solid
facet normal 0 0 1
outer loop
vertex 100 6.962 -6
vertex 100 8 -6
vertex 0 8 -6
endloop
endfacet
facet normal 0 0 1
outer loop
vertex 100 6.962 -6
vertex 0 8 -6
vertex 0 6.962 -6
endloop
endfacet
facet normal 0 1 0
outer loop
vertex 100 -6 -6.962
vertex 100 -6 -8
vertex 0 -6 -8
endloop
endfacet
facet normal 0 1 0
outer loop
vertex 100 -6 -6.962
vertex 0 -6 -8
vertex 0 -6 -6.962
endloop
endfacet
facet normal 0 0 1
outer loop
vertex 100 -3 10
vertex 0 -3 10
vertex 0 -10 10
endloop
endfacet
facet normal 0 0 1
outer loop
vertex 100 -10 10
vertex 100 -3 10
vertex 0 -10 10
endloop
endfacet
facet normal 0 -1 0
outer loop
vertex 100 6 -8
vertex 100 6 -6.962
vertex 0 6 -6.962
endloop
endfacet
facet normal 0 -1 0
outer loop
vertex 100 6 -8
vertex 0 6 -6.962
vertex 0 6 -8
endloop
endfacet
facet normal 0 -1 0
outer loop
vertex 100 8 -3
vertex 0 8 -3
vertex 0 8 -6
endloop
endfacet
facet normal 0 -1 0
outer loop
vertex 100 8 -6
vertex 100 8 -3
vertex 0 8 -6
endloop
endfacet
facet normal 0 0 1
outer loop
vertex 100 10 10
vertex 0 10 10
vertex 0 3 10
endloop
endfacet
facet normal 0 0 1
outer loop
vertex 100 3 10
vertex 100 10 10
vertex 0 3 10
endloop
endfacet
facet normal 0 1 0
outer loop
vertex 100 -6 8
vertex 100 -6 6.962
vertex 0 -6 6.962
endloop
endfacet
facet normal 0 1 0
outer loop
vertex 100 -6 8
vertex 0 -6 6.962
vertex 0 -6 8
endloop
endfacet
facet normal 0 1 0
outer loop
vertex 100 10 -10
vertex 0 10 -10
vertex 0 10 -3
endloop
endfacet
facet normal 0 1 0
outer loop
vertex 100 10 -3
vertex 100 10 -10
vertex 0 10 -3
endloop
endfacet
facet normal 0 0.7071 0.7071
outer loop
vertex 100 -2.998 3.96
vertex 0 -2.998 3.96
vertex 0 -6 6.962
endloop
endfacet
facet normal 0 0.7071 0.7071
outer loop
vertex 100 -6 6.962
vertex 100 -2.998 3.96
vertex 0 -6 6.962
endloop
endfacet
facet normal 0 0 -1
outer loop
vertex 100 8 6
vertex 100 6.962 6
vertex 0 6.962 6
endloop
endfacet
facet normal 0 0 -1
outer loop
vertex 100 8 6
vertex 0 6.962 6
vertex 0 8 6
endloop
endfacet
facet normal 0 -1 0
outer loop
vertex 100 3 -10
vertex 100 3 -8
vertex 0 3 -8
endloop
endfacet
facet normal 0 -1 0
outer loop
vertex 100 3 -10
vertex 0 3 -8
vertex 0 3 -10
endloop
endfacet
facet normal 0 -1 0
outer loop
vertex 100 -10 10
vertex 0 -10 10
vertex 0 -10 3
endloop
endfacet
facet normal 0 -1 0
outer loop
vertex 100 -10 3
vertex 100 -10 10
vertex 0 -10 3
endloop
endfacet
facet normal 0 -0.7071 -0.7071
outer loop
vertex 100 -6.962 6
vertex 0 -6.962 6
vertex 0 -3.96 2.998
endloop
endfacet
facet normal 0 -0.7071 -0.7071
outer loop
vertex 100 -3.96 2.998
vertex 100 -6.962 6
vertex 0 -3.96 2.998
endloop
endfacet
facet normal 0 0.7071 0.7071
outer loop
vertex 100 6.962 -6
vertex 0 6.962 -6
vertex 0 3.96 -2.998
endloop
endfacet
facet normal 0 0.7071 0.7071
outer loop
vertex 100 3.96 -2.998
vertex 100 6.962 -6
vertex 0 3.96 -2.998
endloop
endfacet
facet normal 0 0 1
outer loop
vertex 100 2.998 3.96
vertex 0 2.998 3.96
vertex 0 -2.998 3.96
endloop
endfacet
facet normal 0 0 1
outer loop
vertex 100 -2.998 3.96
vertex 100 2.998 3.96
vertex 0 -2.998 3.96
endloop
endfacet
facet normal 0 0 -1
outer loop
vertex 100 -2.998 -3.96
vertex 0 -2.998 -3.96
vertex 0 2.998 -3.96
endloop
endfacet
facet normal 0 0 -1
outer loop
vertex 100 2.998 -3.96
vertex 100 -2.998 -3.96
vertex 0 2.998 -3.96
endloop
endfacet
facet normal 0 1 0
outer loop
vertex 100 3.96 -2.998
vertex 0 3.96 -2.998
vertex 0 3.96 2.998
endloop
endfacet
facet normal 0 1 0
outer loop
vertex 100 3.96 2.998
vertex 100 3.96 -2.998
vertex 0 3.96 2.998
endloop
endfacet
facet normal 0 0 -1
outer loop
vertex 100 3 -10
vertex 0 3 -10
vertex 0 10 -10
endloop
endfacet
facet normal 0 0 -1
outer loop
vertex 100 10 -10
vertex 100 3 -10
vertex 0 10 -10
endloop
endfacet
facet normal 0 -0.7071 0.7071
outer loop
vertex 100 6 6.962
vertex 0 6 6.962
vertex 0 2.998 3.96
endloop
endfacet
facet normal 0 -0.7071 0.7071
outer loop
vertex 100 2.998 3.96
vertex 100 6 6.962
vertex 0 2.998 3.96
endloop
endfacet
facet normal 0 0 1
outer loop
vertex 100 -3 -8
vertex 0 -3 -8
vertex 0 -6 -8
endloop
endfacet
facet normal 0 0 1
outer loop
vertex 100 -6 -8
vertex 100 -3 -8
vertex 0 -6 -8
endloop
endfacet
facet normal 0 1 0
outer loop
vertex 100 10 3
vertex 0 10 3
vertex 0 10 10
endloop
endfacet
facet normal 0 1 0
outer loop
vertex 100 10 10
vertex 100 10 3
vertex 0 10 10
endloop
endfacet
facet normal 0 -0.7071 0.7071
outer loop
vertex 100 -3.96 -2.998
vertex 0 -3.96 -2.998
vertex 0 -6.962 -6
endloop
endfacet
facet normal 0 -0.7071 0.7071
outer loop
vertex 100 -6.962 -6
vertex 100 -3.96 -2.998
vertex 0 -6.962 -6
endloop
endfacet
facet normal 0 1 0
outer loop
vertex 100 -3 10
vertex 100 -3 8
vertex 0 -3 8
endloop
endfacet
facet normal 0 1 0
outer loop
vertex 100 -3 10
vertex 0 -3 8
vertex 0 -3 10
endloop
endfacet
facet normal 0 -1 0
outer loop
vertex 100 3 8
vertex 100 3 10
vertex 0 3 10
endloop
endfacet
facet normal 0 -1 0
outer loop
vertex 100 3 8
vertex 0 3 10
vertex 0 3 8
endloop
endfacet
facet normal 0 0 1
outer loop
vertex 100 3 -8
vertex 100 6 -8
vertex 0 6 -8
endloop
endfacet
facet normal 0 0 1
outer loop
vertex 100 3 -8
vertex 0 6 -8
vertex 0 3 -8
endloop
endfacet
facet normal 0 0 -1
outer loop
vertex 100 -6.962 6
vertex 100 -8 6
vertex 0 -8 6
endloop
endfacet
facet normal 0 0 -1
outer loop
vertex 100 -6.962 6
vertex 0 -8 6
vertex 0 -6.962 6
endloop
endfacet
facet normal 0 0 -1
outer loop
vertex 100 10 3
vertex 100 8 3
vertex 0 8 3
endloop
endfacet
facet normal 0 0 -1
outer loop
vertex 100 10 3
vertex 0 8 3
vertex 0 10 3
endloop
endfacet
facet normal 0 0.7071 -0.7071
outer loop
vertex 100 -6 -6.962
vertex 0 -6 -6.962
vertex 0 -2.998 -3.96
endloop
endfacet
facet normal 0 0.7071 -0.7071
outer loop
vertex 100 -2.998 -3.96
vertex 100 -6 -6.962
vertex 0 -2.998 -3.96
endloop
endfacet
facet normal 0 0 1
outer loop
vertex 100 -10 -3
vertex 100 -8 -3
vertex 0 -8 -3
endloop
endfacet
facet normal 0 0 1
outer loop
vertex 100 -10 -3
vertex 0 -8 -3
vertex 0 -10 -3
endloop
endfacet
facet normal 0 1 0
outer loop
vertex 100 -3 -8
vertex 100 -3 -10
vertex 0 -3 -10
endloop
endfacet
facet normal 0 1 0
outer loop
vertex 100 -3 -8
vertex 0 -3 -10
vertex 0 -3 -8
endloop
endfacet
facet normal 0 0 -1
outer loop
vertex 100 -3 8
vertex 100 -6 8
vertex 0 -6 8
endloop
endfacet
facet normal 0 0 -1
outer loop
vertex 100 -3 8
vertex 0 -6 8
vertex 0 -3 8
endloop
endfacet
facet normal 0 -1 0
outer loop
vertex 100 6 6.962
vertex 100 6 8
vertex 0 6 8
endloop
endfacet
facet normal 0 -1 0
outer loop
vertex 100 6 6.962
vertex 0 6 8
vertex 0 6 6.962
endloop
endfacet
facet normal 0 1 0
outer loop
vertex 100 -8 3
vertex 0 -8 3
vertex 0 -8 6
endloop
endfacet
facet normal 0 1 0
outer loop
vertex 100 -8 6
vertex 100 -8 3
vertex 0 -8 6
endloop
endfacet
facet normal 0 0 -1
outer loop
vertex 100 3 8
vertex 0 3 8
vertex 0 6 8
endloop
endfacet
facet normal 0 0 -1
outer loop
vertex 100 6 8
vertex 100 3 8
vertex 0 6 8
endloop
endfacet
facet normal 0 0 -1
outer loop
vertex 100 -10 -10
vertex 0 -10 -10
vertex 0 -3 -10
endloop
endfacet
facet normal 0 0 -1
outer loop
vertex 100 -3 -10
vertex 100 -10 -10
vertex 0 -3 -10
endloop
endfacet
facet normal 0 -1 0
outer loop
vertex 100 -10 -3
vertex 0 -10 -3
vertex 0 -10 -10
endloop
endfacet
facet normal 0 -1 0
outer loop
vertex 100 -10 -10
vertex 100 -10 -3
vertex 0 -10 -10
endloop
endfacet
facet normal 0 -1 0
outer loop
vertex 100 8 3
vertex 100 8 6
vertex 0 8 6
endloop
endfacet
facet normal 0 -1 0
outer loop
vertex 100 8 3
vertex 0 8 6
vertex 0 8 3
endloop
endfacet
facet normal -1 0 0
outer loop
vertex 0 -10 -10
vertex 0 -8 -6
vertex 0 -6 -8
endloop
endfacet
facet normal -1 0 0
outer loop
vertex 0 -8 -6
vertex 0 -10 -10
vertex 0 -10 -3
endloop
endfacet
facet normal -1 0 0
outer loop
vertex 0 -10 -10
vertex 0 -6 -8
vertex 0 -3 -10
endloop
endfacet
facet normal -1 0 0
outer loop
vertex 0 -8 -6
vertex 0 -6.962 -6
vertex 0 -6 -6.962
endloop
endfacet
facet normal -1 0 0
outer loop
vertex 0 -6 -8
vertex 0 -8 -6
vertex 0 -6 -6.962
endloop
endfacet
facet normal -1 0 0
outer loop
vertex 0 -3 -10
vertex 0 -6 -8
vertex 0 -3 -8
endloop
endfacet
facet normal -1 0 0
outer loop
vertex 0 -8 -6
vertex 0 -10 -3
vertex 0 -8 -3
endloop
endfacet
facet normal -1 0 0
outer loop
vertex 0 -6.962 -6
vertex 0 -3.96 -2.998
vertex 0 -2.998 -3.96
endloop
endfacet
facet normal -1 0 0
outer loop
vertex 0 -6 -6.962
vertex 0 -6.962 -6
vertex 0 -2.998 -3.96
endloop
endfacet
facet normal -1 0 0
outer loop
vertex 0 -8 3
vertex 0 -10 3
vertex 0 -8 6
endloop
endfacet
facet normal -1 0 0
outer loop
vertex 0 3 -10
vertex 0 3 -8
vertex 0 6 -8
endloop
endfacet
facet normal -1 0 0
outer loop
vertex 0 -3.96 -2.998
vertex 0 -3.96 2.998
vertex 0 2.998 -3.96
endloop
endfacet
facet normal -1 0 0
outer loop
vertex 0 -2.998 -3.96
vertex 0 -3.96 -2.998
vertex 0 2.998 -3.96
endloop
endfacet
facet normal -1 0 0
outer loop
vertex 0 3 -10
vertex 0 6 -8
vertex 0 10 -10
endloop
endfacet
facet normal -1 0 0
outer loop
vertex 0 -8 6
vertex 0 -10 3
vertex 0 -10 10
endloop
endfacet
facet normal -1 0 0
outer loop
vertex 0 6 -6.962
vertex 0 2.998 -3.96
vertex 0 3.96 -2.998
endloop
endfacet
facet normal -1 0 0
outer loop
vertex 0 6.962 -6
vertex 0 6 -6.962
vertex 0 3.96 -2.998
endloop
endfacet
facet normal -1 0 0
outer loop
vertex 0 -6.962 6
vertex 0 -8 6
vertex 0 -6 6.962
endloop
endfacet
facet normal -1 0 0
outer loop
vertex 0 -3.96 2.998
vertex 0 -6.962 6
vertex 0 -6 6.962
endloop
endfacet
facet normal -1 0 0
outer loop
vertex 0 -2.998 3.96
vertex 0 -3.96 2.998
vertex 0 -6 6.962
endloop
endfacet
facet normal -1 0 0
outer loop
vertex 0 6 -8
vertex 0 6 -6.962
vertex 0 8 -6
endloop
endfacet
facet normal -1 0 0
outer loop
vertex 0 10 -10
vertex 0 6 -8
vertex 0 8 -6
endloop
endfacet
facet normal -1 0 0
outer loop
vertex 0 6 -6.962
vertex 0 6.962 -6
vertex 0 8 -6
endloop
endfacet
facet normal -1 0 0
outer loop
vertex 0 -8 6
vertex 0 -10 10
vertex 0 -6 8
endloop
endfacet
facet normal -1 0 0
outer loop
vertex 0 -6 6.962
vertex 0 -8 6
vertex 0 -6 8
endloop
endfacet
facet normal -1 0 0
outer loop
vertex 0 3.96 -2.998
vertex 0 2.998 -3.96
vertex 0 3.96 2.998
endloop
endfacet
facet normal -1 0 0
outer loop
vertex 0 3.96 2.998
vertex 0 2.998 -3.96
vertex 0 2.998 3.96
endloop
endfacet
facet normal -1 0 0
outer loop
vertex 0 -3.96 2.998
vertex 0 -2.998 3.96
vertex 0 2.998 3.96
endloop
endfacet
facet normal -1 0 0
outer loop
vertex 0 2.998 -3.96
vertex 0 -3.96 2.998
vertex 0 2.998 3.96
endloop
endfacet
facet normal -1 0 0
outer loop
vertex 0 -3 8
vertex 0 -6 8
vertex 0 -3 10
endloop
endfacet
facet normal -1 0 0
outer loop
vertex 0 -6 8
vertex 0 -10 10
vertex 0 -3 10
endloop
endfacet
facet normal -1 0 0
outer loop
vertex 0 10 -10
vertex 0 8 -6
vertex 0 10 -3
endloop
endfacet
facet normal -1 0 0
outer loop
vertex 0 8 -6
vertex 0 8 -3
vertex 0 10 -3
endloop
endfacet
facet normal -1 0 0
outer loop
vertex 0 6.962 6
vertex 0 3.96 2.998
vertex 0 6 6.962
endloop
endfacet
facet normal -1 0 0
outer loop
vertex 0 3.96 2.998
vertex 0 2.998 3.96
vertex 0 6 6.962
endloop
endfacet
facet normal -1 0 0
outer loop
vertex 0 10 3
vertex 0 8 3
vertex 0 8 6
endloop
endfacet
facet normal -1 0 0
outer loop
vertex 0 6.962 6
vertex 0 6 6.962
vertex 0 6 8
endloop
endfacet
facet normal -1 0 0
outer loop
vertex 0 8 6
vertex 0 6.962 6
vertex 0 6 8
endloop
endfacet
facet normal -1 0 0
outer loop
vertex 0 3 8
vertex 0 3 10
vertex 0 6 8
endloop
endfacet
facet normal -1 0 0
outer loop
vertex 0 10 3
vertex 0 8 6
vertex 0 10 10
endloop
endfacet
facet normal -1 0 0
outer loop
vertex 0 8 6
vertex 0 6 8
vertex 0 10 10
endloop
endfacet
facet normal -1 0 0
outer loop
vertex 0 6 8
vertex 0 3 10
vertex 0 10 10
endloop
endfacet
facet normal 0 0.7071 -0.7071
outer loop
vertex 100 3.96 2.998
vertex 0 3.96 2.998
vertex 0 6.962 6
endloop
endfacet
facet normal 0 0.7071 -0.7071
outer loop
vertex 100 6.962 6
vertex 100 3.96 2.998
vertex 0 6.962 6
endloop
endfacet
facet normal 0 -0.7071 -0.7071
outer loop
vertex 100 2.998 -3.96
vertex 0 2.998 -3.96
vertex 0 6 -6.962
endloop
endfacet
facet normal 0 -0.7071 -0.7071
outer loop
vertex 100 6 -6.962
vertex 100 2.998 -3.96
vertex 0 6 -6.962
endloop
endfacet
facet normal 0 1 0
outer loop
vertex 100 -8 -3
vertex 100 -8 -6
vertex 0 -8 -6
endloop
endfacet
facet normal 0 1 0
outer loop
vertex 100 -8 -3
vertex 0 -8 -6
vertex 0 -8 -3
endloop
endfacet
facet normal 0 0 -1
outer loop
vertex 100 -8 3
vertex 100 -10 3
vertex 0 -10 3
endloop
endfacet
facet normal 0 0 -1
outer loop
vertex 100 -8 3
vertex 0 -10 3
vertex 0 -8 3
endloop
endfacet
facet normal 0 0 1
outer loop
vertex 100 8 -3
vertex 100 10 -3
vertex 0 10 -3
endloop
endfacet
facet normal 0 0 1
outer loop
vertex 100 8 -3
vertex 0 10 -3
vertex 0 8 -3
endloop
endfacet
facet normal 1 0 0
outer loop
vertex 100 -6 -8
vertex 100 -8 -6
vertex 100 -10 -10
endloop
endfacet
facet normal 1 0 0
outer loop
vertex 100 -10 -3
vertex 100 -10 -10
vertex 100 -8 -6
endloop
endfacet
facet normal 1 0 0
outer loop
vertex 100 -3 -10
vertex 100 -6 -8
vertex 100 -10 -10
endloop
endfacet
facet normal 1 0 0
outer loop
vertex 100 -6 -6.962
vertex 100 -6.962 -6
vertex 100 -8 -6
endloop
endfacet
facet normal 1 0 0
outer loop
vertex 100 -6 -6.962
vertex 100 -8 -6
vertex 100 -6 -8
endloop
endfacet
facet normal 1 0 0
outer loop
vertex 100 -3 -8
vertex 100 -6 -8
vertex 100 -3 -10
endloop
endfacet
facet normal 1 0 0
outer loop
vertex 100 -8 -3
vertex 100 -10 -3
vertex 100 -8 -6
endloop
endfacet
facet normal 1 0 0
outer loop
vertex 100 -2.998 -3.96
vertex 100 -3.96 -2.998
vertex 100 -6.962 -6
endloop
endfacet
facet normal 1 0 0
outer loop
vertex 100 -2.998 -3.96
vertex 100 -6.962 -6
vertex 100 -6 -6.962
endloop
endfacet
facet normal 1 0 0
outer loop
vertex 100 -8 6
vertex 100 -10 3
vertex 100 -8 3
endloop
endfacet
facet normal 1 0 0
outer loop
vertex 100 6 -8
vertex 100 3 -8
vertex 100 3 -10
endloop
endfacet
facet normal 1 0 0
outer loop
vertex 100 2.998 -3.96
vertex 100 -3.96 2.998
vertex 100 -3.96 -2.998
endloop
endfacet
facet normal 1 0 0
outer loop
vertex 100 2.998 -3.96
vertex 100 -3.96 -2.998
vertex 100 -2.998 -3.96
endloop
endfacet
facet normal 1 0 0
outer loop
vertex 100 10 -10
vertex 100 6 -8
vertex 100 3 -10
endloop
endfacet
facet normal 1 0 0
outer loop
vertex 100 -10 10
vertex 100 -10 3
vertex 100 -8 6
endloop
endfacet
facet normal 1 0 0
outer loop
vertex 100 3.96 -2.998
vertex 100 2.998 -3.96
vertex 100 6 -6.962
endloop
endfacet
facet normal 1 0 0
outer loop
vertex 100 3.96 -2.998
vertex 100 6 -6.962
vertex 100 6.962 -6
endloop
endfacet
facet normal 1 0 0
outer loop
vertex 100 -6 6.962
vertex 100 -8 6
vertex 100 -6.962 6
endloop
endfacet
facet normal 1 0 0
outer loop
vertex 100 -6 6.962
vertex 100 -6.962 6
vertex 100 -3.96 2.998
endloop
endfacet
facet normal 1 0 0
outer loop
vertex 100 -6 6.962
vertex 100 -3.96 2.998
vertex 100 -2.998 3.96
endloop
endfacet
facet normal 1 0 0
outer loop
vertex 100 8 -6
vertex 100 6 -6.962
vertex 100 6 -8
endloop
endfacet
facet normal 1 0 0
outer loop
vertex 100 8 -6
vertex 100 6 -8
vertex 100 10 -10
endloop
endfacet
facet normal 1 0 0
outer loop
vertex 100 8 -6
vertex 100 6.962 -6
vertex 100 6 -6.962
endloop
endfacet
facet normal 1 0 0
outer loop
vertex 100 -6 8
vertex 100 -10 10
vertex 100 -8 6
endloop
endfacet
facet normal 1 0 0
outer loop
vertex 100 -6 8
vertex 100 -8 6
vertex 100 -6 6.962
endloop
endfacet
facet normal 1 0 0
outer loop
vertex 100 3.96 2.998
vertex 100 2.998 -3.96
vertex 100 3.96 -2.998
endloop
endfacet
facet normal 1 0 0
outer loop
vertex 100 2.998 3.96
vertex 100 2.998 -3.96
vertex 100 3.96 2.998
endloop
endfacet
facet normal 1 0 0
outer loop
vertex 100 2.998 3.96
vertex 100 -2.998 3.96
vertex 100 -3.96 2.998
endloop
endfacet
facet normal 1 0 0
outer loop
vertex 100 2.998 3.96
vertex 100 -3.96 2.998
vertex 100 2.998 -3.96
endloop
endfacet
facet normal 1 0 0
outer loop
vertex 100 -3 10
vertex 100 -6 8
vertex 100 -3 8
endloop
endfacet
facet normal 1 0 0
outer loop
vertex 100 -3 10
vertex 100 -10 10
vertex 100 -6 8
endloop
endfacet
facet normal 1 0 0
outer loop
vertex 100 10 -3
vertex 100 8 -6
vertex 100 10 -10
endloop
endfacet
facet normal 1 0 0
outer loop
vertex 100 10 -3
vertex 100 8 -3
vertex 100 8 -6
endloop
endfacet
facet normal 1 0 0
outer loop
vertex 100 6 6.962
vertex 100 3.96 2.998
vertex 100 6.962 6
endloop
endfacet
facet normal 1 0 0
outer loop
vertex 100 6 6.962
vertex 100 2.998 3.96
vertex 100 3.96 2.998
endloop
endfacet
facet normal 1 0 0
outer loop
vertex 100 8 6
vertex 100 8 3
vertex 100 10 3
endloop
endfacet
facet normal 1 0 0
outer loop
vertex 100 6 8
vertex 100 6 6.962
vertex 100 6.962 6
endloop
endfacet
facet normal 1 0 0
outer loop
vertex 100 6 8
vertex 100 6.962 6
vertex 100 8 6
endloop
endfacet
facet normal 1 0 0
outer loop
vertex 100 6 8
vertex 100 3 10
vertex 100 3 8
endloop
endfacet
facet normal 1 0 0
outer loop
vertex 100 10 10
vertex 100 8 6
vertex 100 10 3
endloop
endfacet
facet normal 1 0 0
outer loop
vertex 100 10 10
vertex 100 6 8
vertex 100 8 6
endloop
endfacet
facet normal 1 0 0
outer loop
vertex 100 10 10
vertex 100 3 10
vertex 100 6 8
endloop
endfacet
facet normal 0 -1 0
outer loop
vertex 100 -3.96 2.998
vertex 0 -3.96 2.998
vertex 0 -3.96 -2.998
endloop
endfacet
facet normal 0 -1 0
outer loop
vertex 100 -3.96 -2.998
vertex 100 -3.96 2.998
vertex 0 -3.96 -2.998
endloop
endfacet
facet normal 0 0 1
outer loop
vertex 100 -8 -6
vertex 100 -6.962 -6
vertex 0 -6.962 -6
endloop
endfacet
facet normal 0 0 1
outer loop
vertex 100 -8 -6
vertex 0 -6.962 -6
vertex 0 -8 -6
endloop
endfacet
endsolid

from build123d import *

# Parameters (mm, degrees)
F1_DEPTH = 100


with BuildPart() as f1:
    # F0 (on Right) → F1 (new body)
    with BuildSketch(Plane.YZ):
        Polygon((2.998335, 3.96), (0, 3.96), (-2.998335, 3.96), (-6, 6.961665), (-6, 8), (-3, 8), (-3, 10), (-10, 10), (-10, 3), (-8, 3), (-8, 6), (-6.961665, 6), (-3.96, 2.998335), (-3.96, 0), (-3.96, -2.998335), (-6.961665, -6), (-8, -6), (-8, -3), (-10, -3), (-10, -10), (-3, -10), (-3, -8), (-6, -8), (-6, -6.961665), (-2.998335, -3.96), (0, -3.96), (2.998335, -3.96), (6, -6.961665), (6, -8), (3, -8), (3, -10), (10, -10), (10, -3), (8, -3), (8, -6), (6.961665, -6), (3.96, -2.998335), (3.96, 0), (3.96, 2.998335), (6.961665, 6), (8, 6), (8, 3), (10, 3), (10, 10), (3, 10), (3, 8), (6, 8), (6, 6.961665), align=None)
    extrude(amount=F1_DEPTH)


solid = f1.part
